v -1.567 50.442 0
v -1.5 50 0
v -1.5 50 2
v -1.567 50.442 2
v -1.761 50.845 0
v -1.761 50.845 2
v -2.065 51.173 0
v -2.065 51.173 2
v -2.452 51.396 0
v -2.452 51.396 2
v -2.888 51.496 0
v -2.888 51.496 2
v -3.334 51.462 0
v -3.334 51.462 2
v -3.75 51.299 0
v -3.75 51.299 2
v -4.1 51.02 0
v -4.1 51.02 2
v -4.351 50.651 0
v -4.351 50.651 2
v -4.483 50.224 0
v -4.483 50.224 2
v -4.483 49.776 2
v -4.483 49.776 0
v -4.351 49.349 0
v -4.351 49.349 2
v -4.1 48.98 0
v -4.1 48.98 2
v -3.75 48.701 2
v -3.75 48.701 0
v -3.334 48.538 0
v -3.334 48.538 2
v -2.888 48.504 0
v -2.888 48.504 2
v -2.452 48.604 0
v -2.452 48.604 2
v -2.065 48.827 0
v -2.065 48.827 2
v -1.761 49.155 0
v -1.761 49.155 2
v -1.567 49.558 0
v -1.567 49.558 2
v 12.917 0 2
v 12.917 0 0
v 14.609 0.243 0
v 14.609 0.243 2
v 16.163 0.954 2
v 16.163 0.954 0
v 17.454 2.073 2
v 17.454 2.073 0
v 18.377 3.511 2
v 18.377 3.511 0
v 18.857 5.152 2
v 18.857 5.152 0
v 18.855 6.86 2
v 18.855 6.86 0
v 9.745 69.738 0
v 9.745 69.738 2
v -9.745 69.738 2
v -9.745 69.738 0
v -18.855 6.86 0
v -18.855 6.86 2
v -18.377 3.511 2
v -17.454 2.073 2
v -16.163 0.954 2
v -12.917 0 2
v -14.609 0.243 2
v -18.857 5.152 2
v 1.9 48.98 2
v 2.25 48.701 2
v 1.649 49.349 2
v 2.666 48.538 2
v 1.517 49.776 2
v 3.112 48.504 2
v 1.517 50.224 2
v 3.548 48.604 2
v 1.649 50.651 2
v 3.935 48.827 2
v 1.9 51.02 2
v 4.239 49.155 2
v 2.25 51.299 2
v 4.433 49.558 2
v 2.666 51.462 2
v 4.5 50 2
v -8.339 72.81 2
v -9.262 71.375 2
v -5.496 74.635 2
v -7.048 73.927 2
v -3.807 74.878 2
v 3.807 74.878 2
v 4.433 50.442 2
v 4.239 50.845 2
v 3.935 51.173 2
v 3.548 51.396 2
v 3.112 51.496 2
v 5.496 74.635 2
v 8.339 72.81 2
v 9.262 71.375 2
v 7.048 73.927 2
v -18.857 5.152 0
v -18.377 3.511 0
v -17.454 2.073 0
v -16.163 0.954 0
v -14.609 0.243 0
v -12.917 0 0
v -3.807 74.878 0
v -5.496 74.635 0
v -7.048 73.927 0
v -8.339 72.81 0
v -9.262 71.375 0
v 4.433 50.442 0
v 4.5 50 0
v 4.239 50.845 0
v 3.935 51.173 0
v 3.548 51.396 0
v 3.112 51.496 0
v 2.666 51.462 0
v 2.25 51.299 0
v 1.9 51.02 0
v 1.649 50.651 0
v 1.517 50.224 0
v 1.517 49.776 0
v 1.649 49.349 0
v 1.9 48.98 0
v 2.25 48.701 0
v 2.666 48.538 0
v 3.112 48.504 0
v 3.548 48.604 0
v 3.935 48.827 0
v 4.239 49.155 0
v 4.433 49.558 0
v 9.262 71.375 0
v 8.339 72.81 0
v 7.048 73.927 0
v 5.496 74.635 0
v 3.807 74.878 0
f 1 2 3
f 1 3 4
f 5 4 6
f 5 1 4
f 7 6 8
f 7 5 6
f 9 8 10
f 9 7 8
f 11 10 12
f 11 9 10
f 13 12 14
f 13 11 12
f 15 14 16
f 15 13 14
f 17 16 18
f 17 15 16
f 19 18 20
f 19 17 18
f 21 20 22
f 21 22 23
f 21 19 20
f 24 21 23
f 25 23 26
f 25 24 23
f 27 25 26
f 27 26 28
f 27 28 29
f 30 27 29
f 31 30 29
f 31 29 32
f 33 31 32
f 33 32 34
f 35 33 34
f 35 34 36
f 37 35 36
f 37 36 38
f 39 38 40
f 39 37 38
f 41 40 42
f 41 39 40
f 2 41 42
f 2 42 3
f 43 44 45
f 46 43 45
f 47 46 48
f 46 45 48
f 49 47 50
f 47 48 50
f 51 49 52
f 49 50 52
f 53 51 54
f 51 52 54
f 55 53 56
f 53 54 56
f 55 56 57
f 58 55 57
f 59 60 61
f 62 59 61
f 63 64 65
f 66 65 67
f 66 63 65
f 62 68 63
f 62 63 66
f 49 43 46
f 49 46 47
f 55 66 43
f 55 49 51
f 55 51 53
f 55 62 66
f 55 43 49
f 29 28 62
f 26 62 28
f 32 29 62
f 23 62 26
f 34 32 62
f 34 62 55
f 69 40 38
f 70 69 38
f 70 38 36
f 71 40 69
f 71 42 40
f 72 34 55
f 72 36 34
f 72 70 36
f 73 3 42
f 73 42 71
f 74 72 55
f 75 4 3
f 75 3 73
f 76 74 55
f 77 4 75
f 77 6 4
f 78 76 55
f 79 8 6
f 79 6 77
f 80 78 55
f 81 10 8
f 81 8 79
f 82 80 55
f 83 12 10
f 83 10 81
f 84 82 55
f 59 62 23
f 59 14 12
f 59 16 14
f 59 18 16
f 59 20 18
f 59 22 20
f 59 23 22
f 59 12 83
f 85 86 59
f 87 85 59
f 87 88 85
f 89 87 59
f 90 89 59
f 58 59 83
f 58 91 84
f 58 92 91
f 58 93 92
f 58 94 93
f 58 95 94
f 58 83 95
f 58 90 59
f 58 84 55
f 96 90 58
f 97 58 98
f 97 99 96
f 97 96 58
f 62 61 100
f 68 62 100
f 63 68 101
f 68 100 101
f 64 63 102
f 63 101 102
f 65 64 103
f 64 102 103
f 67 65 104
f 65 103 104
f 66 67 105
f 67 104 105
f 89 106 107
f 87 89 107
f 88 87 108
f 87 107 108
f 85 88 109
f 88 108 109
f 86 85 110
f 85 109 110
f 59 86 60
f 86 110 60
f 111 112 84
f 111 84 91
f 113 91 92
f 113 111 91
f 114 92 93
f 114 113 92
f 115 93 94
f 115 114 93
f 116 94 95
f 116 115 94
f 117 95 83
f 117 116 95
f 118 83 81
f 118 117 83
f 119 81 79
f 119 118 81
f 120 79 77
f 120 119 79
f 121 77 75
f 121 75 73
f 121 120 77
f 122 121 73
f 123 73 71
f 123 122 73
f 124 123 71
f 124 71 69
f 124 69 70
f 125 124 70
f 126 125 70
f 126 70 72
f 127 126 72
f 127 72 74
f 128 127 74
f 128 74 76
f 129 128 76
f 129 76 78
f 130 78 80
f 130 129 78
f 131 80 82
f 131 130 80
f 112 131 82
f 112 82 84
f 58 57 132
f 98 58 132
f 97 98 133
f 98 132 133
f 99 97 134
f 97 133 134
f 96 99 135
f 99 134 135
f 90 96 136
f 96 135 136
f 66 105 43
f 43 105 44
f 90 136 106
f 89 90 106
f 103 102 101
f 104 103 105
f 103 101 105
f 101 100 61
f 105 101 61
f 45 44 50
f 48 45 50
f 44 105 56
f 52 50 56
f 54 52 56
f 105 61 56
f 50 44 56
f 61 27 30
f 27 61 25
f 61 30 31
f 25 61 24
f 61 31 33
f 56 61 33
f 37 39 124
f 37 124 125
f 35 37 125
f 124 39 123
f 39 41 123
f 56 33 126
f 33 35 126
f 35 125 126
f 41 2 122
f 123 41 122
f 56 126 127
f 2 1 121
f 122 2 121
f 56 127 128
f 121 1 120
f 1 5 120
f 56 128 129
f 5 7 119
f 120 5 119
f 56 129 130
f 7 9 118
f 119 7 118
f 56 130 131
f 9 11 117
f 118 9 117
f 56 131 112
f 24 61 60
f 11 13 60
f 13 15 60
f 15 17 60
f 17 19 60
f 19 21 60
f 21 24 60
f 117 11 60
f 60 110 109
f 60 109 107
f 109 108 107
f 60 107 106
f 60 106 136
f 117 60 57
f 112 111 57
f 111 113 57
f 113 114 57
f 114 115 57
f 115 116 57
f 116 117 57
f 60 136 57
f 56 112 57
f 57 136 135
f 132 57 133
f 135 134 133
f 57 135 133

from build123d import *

# Parameters (mm, degrees)
SKETCH_1_R      = 1.5
EXTRUDE_1_DEPTH = 2


with BuildPart() as part:
    # 草图1 → 凸台-拉伸1 (new body)
    with BuildSketch(Plane.XY):
        with BuildLine():
            Line((-12.91723747, 0), (12.91723747, 0))
            ThreePointArc((12.91723747, 0), (17.453878353, 2.073310619), (18.855230664, 6.860370167))
            Line((18.855230664, 6.860370167), (9.744693373, 69.738315612))
            ThreePointArc((9.744693373, 69.738315612), (7.73338956, 73.414586328), (3.806700178, 74.877945445))
            Line((3.806700178, 74.877945445), (0, 74.877945445))
            Line((0, 74.877945445), (-3.806700178, 74.877945445))
            ThreePointArc((-3.806700178, 74.877945445), (-7.73338956, 73.414586328), (-9.744693373, 69.738315612))
            Line((-9.744693373, 69.738315612), (-18.855230664, 6.860370167))
            ThreePointArc((-18.855230664, 6.860370167), (-17.453878353, 2.073310619), (-12.91723747, 0))
        make_face()
        with Locations((-3, 50)):
            Circle(SKETCH_1_R, mode=Mode.SUBTRACT)
        with Locations((3, 50)):
            Circle(SKETCH_1_R, mode=Mode.SUBTRACT)
    extrude(amount=EXTRUDE_1_DEPTH)


solid = part.part
